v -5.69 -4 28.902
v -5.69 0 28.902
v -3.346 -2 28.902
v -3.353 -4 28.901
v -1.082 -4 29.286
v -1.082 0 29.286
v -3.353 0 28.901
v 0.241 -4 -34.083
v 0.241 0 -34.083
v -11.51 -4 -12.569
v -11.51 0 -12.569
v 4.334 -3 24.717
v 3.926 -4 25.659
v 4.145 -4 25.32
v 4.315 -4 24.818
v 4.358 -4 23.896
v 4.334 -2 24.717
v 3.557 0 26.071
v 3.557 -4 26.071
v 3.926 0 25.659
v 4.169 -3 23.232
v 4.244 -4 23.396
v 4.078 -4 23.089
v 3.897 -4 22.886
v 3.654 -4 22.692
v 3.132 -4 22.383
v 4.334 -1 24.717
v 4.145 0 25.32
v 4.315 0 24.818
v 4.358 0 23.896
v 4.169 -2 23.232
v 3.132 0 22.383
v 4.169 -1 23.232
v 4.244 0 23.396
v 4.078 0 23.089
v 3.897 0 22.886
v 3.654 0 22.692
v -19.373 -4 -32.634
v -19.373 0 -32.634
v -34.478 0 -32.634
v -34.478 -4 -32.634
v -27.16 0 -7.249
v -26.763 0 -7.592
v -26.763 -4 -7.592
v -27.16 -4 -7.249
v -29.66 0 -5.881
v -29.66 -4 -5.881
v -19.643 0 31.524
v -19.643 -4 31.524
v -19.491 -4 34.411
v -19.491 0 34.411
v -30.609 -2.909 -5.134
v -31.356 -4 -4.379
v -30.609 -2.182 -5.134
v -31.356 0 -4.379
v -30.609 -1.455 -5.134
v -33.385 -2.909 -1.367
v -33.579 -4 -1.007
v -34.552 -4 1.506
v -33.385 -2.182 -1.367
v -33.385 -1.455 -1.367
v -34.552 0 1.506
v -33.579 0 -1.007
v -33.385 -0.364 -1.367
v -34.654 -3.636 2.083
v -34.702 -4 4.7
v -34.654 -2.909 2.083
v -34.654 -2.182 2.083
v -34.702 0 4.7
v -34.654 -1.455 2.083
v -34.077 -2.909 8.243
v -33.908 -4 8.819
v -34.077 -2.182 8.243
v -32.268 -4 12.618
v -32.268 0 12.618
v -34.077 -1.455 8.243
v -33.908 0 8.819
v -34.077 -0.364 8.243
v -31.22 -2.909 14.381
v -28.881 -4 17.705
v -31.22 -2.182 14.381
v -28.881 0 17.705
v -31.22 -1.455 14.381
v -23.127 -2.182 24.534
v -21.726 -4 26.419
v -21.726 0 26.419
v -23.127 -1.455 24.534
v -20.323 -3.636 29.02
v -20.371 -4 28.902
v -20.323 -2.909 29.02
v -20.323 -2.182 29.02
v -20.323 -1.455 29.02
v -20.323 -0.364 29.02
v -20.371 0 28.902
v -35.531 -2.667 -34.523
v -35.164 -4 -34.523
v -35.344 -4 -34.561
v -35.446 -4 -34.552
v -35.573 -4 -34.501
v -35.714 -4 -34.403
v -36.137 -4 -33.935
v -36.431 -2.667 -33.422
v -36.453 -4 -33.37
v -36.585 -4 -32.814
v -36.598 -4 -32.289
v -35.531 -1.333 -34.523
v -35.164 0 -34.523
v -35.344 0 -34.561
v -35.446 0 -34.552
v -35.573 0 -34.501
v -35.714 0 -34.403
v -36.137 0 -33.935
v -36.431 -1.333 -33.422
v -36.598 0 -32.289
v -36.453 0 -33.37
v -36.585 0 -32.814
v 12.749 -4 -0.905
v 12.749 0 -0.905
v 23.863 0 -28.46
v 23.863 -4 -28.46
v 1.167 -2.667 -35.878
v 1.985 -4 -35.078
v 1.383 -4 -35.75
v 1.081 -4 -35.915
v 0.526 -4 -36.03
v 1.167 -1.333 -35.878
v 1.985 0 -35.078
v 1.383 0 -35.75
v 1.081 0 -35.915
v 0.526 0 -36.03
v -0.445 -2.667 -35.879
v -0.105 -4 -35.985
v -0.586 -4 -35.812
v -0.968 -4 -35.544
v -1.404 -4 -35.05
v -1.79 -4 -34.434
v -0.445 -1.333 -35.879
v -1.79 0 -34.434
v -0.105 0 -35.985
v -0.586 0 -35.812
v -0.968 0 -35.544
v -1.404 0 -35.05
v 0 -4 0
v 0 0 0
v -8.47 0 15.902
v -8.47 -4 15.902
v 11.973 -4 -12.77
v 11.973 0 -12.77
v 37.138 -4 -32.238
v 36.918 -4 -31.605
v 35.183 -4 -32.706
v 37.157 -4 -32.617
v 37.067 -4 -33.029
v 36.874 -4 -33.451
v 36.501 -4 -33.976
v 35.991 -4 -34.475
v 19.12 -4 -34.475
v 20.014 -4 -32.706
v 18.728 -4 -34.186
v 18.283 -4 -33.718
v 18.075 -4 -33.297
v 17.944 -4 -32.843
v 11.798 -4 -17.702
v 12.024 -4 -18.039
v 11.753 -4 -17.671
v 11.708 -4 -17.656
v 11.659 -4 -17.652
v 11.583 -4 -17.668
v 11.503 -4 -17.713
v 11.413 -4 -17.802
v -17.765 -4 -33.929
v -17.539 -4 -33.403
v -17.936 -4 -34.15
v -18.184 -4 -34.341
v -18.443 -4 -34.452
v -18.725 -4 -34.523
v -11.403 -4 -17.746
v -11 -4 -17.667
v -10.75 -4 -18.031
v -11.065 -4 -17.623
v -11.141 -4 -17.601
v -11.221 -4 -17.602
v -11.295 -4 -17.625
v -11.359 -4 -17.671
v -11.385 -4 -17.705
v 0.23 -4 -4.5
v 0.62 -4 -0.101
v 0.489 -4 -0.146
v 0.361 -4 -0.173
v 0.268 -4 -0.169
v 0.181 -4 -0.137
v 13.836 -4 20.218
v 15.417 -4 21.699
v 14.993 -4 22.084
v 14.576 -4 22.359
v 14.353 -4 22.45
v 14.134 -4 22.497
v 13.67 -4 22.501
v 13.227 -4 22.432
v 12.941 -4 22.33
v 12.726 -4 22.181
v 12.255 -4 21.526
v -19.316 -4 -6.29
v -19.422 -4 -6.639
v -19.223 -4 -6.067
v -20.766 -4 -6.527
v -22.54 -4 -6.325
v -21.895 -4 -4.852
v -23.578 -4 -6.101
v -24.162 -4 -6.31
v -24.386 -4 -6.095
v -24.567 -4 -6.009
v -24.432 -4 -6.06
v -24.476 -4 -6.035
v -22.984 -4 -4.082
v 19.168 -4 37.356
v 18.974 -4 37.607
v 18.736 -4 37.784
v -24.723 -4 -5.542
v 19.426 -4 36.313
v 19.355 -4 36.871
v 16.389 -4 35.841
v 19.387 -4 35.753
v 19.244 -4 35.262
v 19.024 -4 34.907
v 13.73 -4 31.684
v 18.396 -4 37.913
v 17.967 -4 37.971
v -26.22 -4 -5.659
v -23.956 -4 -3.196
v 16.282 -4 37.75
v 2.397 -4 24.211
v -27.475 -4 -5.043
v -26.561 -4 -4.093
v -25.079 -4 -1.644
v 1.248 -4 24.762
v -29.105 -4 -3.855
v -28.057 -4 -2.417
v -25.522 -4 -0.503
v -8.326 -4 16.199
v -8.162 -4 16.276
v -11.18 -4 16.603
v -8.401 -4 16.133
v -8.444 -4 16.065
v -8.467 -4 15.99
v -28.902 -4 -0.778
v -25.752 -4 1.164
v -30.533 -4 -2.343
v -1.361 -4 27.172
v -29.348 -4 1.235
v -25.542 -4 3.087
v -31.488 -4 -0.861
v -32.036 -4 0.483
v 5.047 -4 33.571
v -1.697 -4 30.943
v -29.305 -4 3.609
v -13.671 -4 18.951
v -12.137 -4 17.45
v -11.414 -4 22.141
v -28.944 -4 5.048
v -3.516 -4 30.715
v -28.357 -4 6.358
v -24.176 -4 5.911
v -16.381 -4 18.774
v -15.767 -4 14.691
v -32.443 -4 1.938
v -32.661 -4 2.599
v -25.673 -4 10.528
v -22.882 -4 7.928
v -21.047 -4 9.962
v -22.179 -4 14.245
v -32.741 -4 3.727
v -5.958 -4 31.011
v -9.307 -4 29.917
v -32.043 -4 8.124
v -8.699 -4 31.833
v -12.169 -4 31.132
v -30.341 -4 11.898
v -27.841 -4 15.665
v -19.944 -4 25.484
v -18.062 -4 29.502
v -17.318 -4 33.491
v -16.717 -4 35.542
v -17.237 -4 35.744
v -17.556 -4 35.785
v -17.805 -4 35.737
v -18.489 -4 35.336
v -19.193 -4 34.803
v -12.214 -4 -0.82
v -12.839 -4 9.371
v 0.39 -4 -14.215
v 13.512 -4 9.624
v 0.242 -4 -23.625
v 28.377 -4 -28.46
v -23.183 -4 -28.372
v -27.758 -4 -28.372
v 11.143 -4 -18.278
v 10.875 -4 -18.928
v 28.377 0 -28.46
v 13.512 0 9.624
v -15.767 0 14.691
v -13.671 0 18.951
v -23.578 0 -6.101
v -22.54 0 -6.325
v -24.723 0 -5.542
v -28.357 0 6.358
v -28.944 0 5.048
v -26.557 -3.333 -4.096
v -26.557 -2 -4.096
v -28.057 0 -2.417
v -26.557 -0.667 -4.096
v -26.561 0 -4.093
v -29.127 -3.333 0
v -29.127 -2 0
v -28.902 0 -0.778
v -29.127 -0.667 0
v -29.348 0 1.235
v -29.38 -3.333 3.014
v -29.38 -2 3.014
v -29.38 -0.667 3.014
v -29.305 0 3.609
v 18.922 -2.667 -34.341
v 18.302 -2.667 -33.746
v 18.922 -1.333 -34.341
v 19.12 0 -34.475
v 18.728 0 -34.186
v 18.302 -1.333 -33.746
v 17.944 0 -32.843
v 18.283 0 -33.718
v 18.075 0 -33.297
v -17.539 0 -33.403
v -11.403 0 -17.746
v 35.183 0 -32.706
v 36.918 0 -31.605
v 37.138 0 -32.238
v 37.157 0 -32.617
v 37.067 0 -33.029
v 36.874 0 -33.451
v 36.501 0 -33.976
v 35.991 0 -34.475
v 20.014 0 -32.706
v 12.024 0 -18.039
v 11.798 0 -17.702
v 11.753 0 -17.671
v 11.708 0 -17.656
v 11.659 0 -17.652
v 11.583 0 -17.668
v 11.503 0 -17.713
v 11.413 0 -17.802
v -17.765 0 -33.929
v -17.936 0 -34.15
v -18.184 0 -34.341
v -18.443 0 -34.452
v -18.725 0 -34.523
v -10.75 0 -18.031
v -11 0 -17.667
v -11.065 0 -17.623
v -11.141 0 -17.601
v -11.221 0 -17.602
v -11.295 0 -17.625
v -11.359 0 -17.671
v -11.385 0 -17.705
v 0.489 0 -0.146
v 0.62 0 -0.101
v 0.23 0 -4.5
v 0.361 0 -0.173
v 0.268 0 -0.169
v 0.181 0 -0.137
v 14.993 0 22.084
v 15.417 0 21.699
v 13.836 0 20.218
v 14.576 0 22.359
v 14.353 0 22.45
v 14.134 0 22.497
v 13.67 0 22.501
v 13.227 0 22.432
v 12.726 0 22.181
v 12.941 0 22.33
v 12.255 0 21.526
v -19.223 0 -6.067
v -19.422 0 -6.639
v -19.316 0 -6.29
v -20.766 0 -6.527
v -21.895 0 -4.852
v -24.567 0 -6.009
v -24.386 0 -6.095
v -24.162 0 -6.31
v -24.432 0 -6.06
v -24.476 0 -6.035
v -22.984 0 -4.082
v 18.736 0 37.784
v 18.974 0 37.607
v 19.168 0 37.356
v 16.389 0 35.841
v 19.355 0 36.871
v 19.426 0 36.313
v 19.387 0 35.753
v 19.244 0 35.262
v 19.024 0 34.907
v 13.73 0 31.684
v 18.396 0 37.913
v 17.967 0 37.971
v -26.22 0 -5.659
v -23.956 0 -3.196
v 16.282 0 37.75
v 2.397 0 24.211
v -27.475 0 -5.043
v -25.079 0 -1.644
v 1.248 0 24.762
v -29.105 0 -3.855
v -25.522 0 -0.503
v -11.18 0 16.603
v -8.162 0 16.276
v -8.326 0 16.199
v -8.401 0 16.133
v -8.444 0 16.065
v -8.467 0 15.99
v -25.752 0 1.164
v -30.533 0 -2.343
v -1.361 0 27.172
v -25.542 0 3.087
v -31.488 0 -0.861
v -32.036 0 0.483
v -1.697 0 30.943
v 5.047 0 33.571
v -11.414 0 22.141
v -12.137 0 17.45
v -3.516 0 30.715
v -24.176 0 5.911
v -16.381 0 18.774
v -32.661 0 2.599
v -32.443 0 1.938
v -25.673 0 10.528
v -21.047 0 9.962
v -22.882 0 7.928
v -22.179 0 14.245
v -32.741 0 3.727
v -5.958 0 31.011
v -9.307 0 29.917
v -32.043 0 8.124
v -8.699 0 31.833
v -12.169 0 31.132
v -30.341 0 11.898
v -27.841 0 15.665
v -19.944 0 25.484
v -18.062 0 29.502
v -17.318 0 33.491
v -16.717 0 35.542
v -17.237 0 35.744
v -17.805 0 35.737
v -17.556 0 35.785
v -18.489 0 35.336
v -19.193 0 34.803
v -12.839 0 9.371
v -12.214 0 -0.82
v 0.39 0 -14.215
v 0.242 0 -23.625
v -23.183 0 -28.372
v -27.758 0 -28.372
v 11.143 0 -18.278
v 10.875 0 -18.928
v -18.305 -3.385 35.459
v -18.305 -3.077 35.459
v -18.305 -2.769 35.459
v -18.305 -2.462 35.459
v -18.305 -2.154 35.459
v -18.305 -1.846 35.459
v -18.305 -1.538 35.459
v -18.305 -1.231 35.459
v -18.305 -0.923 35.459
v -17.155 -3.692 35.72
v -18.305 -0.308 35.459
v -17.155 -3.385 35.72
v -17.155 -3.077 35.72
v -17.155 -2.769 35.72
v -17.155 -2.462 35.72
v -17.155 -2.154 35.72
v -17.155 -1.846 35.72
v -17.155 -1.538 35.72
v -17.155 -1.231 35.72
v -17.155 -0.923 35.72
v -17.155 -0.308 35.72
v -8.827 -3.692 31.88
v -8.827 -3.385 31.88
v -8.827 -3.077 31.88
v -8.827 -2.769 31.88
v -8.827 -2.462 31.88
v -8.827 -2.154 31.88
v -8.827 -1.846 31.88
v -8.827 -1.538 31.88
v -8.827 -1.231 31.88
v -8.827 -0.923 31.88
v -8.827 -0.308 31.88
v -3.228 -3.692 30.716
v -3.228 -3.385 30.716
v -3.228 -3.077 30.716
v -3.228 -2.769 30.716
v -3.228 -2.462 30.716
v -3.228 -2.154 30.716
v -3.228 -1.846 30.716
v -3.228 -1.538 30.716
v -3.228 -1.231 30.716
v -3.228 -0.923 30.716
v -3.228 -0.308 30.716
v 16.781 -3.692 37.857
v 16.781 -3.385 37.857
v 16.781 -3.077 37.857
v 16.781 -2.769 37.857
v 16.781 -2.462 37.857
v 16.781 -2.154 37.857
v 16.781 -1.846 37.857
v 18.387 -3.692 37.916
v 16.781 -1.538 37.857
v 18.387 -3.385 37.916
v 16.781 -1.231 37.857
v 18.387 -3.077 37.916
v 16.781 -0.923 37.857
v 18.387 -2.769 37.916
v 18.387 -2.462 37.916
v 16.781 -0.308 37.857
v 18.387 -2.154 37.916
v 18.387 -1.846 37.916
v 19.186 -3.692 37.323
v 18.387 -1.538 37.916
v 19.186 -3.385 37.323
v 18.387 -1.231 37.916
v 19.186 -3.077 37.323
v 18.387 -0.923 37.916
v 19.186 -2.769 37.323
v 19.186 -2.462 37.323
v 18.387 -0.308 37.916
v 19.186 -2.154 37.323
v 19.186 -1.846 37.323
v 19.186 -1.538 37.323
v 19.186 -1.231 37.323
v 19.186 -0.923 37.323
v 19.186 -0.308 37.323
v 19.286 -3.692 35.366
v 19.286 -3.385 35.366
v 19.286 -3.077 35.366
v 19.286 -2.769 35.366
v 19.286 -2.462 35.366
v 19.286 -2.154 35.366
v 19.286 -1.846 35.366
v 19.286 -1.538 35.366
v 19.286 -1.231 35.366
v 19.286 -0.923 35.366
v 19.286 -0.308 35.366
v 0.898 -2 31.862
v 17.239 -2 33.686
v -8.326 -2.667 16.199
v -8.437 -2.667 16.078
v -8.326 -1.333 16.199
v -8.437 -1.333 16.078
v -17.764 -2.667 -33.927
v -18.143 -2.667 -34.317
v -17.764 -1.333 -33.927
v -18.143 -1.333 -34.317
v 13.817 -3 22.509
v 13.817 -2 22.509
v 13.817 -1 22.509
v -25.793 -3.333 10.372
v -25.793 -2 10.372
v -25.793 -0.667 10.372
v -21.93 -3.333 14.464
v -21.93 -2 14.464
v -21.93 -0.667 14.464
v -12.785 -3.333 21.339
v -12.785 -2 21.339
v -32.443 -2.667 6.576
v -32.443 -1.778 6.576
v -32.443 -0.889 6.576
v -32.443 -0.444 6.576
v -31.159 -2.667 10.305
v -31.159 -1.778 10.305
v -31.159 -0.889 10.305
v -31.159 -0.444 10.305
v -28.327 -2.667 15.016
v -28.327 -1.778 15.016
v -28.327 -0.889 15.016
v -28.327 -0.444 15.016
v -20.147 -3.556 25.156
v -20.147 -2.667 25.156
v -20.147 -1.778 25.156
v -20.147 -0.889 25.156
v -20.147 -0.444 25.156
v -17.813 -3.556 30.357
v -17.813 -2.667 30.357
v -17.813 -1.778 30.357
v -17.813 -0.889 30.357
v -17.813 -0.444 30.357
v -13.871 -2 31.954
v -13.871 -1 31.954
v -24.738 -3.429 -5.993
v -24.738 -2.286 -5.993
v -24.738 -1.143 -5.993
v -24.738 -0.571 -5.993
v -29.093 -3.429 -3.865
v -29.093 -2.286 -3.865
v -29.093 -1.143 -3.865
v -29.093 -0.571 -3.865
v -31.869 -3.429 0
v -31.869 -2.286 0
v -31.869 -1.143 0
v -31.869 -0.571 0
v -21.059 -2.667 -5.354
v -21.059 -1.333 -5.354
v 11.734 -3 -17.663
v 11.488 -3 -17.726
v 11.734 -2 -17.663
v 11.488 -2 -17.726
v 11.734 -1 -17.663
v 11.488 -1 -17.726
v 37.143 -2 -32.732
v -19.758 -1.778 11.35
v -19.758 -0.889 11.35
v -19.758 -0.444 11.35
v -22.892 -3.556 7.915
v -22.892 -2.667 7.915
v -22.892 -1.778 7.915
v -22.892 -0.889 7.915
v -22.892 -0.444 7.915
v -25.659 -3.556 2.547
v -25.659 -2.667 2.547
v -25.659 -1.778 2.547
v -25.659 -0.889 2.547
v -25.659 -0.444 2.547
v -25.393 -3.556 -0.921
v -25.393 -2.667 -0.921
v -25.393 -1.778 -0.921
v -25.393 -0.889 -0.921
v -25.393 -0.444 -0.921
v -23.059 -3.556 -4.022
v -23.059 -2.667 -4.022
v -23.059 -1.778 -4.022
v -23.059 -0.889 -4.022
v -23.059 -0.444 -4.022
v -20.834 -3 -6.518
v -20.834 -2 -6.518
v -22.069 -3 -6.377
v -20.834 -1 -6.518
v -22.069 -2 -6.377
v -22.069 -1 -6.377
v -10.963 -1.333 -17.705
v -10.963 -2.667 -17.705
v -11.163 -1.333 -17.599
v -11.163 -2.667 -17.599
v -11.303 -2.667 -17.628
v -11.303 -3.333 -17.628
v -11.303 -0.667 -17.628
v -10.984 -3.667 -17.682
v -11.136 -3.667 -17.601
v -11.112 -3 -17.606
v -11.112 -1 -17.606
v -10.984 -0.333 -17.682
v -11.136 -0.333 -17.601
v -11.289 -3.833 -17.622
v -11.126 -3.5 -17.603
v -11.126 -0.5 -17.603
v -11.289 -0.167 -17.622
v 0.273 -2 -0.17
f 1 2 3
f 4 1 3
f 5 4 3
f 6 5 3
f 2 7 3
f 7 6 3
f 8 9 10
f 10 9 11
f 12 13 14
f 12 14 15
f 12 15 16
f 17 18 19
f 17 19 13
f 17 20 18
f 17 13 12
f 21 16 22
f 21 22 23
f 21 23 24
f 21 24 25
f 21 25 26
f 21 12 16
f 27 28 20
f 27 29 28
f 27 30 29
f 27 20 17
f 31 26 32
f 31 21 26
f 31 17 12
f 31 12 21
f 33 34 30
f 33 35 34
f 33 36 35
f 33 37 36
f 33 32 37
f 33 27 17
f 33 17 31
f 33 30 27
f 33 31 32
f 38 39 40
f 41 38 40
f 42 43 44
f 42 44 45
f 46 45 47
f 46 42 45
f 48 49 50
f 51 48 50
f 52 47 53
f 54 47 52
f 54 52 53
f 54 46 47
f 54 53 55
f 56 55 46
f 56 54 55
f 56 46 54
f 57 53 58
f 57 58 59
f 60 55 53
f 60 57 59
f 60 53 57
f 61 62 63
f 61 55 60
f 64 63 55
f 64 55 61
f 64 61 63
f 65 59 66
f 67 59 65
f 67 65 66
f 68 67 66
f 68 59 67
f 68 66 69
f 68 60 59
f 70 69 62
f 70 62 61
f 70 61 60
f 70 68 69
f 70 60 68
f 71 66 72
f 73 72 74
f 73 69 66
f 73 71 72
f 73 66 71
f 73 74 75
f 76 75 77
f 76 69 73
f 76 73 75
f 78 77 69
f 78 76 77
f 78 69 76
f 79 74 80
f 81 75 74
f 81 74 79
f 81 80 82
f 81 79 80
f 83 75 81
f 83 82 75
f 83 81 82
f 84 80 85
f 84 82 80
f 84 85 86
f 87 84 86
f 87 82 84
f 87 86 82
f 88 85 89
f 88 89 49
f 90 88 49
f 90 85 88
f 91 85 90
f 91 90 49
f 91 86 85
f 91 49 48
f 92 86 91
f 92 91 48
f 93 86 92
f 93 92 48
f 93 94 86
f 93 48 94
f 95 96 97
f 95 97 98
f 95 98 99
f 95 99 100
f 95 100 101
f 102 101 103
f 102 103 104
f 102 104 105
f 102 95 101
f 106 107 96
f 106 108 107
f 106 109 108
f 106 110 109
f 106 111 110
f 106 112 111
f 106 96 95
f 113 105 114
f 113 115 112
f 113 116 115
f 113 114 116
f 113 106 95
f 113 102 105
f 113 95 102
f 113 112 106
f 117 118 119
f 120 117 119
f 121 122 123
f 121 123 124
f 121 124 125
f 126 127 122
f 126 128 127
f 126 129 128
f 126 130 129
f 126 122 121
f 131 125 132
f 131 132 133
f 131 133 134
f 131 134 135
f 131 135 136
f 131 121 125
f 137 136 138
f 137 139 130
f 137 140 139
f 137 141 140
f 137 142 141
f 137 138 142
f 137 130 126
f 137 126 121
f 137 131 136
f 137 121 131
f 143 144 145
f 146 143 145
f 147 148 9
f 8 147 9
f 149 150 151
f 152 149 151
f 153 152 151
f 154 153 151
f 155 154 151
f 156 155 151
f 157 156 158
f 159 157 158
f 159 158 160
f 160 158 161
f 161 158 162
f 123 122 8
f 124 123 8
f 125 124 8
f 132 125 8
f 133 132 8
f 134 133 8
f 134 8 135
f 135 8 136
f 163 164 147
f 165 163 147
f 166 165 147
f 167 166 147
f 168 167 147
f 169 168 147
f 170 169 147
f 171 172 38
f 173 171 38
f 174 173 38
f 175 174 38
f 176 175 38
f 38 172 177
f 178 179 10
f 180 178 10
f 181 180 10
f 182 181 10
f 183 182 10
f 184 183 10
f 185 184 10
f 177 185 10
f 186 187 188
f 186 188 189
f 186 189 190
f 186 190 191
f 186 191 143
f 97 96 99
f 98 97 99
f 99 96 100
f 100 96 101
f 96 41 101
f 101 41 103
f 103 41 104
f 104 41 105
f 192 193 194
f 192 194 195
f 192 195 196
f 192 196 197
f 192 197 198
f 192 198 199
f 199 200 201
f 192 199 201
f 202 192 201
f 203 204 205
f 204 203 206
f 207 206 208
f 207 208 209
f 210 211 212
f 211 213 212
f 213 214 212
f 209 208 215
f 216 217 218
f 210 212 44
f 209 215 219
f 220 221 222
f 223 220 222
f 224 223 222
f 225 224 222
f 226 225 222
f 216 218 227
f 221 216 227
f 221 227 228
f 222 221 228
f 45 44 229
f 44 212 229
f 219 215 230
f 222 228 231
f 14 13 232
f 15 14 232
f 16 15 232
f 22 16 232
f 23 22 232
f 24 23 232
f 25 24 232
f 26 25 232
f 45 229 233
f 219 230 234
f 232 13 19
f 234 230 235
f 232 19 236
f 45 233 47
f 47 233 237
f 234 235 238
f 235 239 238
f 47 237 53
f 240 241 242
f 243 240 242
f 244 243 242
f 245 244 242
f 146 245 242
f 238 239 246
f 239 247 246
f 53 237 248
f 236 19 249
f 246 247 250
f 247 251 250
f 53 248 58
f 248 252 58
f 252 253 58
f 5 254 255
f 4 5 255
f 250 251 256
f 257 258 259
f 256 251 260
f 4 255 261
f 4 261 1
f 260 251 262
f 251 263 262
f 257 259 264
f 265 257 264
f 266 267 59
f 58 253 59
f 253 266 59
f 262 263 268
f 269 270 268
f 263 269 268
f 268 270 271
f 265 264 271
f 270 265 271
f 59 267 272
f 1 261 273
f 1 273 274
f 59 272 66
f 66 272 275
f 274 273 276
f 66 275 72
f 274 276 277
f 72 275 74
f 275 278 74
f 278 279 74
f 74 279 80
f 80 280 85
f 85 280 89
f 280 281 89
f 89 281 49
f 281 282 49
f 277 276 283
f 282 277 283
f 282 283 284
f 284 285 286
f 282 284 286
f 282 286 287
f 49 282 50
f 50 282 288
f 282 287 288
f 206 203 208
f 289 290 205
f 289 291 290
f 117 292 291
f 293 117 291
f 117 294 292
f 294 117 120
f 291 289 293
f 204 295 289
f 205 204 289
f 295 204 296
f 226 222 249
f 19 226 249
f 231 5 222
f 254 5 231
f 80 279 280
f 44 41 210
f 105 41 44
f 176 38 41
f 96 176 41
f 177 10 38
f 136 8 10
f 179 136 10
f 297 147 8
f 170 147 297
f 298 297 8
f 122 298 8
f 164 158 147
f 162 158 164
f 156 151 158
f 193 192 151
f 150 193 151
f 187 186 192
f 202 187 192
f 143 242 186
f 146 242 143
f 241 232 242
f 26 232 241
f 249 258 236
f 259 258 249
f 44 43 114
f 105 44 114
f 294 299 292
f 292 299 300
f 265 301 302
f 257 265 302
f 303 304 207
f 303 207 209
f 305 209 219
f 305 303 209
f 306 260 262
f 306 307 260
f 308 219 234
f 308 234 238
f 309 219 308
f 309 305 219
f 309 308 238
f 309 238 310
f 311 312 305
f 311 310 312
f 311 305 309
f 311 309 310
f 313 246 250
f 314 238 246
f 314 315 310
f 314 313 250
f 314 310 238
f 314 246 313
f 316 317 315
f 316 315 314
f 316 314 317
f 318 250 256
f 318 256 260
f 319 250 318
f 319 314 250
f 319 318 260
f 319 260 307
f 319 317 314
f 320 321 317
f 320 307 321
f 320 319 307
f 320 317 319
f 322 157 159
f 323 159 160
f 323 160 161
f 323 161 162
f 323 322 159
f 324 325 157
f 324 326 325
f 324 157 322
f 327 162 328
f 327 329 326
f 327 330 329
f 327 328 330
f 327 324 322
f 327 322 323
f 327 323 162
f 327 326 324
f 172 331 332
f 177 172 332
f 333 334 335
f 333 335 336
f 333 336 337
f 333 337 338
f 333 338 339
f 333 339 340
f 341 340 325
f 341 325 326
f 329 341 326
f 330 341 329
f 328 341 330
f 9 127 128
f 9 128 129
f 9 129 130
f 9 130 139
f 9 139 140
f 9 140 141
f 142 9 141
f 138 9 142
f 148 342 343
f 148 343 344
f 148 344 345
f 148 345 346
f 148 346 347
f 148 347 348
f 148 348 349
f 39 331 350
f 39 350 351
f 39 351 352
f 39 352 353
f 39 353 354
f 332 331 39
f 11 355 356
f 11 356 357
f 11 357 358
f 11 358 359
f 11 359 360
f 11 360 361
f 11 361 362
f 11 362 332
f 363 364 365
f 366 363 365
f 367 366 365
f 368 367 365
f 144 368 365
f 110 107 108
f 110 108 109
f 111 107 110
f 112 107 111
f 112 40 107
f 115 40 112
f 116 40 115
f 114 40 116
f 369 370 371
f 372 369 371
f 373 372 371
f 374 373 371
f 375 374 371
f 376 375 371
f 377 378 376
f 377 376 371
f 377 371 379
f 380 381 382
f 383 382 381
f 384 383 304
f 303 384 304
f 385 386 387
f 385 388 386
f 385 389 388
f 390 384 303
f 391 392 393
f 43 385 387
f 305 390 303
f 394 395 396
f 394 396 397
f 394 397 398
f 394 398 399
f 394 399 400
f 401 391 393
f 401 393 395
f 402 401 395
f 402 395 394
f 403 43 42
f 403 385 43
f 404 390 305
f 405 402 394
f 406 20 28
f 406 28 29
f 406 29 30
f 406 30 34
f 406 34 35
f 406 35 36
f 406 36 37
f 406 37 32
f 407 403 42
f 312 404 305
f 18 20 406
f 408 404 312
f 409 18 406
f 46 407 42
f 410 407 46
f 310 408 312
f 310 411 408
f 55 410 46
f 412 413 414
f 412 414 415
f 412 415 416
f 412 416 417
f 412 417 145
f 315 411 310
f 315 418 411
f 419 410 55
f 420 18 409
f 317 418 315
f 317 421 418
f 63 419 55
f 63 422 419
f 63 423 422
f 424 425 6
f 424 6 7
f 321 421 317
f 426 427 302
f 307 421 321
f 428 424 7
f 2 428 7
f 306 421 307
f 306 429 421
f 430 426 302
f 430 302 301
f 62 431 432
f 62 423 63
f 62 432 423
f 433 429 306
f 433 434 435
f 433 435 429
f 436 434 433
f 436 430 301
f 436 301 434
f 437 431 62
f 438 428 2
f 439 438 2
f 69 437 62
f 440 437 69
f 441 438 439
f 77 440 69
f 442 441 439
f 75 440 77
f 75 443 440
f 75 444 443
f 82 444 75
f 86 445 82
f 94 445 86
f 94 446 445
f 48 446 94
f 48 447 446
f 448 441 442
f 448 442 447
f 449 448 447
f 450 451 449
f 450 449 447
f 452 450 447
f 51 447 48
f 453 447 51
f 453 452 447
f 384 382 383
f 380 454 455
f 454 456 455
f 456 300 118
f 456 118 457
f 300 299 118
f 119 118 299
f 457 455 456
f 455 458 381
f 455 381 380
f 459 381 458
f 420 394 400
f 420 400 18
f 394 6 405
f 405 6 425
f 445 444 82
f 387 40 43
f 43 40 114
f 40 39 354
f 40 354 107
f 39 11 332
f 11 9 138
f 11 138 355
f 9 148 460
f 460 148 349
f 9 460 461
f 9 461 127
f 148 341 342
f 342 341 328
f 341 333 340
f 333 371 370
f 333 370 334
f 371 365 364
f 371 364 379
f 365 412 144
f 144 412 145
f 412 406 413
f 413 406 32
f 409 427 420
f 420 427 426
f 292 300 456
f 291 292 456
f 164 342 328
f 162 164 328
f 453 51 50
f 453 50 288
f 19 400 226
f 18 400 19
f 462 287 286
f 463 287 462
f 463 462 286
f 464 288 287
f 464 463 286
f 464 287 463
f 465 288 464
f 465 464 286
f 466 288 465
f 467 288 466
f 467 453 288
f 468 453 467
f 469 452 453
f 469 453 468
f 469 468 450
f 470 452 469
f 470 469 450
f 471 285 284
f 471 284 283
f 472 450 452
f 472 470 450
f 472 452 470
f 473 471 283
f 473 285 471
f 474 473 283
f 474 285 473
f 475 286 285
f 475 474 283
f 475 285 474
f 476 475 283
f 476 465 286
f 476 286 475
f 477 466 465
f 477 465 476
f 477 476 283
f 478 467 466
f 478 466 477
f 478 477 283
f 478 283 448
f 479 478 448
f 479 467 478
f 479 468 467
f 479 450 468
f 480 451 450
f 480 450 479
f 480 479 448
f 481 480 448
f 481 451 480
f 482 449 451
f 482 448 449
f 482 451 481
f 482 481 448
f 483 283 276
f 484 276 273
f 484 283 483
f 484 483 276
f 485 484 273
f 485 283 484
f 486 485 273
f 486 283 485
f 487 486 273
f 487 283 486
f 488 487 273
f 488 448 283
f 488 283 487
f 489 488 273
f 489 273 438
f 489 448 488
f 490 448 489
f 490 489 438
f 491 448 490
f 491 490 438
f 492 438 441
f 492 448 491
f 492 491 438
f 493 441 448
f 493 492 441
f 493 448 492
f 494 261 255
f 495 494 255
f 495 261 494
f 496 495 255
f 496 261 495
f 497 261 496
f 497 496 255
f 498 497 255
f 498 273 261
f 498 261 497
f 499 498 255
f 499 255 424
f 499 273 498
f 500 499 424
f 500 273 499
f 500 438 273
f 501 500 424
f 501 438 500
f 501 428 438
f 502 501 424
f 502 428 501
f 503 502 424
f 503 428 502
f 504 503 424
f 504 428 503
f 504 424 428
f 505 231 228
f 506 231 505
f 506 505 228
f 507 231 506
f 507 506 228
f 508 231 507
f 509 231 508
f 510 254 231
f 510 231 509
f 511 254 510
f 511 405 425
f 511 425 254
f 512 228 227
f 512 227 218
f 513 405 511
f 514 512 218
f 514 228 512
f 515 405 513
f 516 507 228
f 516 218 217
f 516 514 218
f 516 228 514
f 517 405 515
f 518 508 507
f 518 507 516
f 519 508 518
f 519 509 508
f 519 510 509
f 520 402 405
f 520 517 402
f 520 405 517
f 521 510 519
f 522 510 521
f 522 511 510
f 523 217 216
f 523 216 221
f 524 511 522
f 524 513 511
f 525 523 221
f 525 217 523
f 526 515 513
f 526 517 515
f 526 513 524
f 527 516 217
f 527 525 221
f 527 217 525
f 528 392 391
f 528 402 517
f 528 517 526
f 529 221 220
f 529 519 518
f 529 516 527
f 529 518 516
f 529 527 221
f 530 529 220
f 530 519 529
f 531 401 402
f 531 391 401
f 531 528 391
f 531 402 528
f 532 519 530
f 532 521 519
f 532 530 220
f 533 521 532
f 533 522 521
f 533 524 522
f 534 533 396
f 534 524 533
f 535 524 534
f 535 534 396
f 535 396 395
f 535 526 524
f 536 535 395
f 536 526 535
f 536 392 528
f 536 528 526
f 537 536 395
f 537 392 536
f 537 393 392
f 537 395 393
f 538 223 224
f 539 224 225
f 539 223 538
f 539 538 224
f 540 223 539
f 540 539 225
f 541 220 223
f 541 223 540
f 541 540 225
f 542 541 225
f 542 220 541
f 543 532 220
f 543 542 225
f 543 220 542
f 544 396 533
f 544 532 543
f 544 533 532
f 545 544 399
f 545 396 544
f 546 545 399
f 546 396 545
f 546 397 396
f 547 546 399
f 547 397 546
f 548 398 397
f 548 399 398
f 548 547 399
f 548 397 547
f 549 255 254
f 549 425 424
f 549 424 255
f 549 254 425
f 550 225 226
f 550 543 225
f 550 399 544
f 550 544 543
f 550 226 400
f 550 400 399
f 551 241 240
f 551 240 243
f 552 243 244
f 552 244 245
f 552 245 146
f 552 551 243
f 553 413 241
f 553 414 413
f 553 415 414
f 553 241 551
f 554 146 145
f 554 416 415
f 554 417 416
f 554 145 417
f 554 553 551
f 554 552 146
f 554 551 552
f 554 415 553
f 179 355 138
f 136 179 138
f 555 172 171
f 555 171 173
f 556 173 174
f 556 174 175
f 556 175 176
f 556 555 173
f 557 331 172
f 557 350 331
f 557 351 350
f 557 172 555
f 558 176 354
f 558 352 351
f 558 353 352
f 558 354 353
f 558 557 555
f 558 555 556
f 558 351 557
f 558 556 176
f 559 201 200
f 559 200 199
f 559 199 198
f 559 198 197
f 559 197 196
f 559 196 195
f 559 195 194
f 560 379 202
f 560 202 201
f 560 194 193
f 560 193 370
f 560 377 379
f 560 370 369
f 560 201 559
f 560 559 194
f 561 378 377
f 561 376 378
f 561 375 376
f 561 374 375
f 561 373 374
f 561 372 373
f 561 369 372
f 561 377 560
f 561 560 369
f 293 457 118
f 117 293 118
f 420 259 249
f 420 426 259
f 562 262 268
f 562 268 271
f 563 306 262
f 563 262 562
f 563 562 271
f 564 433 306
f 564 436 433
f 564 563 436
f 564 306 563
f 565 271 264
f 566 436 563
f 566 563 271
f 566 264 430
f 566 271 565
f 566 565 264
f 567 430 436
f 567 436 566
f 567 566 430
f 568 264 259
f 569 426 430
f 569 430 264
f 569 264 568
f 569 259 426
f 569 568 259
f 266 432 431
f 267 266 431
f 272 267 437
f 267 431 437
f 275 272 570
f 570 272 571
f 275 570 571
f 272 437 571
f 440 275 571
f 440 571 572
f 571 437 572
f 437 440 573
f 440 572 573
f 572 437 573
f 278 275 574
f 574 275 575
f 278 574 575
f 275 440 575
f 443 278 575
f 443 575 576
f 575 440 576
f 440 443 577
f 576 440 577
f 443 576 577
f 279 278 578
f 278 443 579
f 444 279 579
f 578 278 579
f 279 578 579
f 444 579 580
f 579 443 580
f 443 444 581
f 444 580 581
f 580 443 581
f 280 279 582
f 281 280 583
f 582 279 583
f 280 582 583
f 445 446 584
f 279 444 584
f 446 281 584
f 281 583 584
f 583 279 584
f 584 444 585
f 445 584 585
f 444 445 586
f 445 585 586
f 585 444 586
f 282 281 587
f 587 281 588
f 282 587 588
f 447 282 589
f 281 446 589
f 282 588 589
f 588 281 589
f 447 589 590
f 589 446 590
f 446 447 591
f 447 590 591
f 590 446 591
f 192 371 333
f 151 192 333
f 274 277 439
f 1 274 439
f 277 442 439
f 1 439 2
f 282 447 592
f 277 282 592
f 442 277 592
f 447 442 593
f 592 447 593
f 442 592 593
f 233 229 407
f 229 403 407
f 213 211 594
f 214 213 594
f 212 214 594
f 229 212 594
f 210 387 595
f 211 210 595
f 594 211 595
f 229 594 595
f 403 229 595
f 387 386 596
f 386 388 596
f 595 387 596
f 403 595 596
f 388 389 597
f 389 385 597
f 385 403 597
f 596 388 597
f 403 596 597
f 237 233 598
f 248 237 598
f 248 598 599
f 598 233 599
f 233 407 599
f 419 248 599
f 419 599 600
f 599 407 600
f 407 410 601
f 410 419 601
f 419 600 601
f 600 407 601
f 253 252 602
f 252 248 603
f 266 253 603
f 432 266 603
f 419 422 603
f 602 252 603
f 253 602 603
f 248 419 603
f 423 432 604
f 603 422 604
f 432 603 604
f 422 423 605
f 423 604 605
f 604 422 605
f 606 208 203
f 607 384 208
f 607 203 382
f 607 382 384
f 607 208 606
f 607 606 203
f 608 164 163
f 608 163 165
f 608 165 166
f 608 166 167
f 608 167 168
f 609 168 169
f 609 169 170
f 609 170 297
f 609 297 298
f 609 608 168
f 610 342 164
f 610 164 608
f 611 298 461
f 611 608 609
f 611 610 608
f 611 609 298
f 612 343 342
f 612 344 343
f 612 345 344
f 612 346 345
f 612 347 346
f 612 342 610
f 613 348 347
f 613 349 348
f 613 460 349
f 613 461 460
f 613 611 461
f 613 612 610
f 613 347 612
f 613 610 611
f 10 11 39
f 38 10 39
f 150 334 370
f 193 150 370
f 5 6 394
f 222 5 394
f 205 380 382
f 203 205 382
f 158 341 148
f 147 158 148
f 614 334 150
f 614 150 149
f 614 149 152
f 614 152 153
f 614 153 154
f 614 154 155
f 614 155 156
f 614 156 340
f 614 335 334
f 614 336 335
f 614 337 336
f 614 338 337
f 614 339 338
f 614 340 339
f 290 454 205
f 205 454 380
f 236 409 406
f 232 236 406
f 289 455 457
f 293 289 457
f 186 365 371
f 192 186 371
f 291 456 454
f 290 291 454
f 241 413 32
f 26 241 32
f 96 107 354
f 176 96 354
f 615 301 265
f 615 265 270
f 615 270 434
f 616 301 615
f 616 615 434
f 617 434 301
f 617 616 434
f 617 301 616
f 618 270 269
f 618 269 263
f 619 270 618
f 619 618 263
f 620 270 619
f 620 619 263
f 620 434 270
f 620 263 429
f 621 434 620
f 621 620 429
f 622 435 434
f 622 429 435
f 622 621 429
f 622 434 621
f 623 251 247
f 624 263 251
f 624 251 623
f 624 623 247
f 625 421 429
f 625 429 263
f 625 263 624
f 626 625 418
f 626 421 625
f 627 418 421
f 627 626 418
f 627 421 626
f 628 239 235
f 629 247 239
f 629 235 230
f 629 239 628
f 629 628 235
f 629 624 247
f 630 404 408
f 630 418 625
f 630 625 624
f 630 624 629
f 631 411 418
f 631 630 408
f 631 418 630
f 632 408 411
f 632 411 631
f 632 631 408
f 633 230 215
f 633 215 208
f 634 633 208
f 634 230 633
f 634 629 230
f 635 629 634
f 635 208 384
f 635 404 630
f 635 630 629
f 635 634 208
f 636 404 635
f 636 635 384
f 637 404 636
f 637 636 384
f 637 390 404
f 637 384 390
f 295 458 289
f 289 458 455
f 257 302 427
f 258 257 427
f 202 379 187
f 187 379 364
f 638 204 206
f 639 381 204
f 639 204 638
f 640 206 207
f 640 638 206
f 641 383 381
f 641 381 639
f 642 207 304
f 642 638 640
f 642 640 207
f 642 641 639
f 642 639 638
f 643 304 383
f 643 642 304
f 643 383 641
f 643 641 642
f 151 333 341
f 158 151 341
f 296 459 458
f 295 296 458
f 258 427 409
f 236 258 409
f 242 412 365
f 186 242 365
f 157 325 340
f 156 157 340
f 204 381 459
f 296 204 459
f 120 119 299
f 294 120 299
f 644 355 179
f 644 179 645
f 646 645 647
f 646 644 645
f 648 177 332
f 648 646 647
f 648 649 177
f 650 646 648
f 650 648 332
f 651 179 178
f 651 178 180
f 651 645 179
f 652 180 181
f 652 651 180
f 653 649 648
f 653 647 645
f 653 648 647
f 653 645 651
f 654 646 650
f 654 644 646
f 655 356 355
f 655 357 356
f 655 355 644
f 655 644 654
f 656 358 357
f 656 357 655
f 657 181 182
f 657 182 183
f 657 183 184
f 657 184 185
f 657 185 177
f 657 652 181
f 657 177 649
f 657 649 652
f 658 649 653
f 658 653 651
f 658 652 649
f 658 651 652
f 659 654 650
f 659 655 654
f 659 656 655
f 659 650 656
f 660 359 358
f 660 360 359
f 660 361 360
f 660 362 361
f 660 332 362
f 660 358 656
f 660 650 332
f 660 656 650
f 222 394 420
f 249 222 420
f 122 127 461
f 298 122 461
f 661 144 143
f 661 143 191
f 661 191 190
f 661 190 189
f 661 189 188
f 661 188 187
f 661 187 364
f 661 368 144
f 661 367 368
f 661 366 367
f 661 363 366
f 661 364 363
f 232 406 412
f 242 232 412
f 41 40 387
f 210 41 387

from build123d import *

# Parameters (mm, degrees)
F1_DEPTH = 4
F3_DEPTH = 4


# Not quite as in the source:
# - the program builds the solid bodies; features that only make, move or delete a surface that nothing else refers to are left out


with BuildPart() as f1:
    # F0 (on Front) → F1 (new body)
    with BuildSketch(Plane.XZ):
        Polygon((-19.4217161833, -6.6394530033), (-27.7575291693, -28.3715538681), (-23.1834277511, -28.3715538681), (-12.2142331675, -0.81999955), (0.2424462854, -23.6251421751), (12.7486815966, -0.9048308448), (23.8632653011, -28.4597538413), (28.3766854557, -28.4597538413), (13.5119855407, 9.6240406854), (0.3901409885, -14.2146594537), (-12.8388348967, 9.3706743792), (-19.2233994603, -6.0667619109), (-19.315803546, -6.2901886101), (-19.0307870507, -6.5492987633), align=None)
    extrude(amount=F1_DEPTH)

    # F0 (on Front) → F3 (join)
    with BuildSketch(Plane.XZ):
        with BuildLine():
            add(Edge.make_bspline(
                [(-35.1637251496, -34.5231422063), (-35.2745312626, -34.5561823678), (-35.6035289606, -34.654304467), (-36.6117457532, -33.4166323146), (-36.6023133695, -32.6509350181), (-36.5978814662, -32.2887599468)],
                knots=[0, 0, 0, 0, 0.2111198615, 0.6268416674, 1, 1, 1, 1], degree=3))
            Line((-35.1637251496, -34.5231422063), (-18.7250807702, -34.5231422063))
            add(Edge.make_bspline(
                [(-17.538975038, -33.402744049), (-17.611132101, -33.5982034924), (-17.7255501876, -33.9379030837), (-18.1198933231, -34.3655062286), (-18.5178964655, -34.4823988841), (-18.7250807702, -34.5231422063)],
                knots=[0, 0, 0, 0, 0.3313469636, 0.6551303283, 1, 1, 1, 1], degree=3))
            Line((-17.538975038, -33.402744049), (-11.4031481076, -17.7456413598))
            add(Edge.make_bspline(
                [(-10.749549605, -18.0306378752), (-10.8298087166, -17.9267145736), (-10.9355150168, -17.6876046133), (-11.1533348511, -17.5614089352), (-11.3649684936, -17.6323335618), (-11.4031481076, -17.7456413598)],
                knots=[0, 0, 0, 0, 0.3827269779, 0.6748101929, 1, 1, 1, 1], degree=3))
            Line((-10.749549605, -18.0306378752), (-1.789764151, -34.4338202755))
            add(Edge.make_bspline(
                [(1.9849899689, -35.0782312452), (1.7096466368, -35.4211391418), (1.3050154791, -36.05677829), (-0.6620473159, -36.123537512), (-1.4189460368, -35.0981913004), (-1.789764151, -34.4338202755)],
                knots=[0, 0, 0, 0, 0.2856387916, 0.6247331157, 1, 1, 1, 1], degree=3))
            Line((1.9849899689, -35.0782312452), (10.8746383339, -18.9282409847))
            add(Edge.make_bspline(
                [(12.0244985446, -18.0388428271), (11.9725750544, -17.9490208887), (11.8797340892, -17.78841621), (11.744725143, -17.6291823261), (11.3691565314, -17.67640337), (11.0777840099, -18.4139921669), (10.8746383339, -18.9282409847)],
                knots=[0, 0, 0, 0, 0.2060682504, 0.3684570355, 0.559686611, 1, 1, 1, 1], degree=3))
            Line((12.0244985446, -18.0388428271), (17.9444543715, -32.8427049722))
            add(Edge.make_bspline(
                [(19.1195974171, -34.4750714604), (19.0590878531, -34.4462685115), (18.9069963789, -34.3306804628), (18.1880916185, -33.7704461278), (18.0246763229, -33.1607819226), (17.9444543715, -32.8427049722)],
                knots=[0, 0, 0, 0, 0.2036652656, 0.5896746092, 1, 1, 1, 1], degree=3))
            Line((19.1195974171, -34.4750714604), (35.9913371503, -34.4750714604))
            add(Edge.make_bspline(
                [(36.917551974, -31.6054179477), (37.096636226, -31.9865397753), (37.358811422, -32.7884619292), (36.6453477203, -33.9356747232), (35.9913371503, -34.4750714604)],
                knots=[0, 0, 0, 0, 0.4258250202, 1, 1, 1, 1], degree=3))
            Line((36.917551974, -31.6054179477), (15.4165393649, 21.6992097865))
            add(Edge.make_bspline(
                [(12.2546441238, 21.5262000154), (12.5737046322, 22.0672148588), (12.886276927, 22.4090391583), (13.8326309549, 22.5382735172), (14.5347285525, 22.471159047), (15.1069781666, 22.0141567545), (15.4165393649, 21.6992097865)],
                knots=[0, 0, 0, 0, 0.2748904441, 0.5080982642, 0.721442809, 1, 1, 1, 1], degree=3))
            Line((12.2546441238, 21.5262000154), (0.6201447686, -0.1007694518))
            add(Edge.make_bspline(
                [(0, 0), (0.0863636294, -0.0759495763), (0.2632816512, -0.2315341538), (0.4993266168, -0.1450406271), (0.6201447686, -0.1007694518)],
                knots=[0, 0, 0, 0, 0.4881562014, 1, 1, 1, 1], degree=3))
            Line((0, 0), (-8.4702158347, 15.9015208483))
            add(Edge.make_bspline(
                [(-8.1622106954, 16.276223585), (-8.3447881043, 16.2160024047), (-8.4849828854, 16.110856086), (-8.4702158347, 15.9015208483)],
                knots=[0, 0, 0, 0, 0.4850456749, 0.4850456749, 0.4850456749, 0.4850456749], degree=3))
            Line((-8.1622106954, 16.276223585), (3.1315775122, 22.3828852177))
            add(Edge.make_bspline(
                [(3.5565522512, 26.0707366595), (3.7250692348, 25.8944983199), (4.0768574738, 25.526591336), (4.4162895921, 24.7345286511), (4.3867106206, 23.0702393334), (3.542298202, 22.6078100122), (3.1315775122, 22.3828852177)],
                knots=[0, 0, 0, 0, 0.2048403686, 0.4276152529, 0.721593083, 1, 1, 1, 1], degree=3))
            add(Edge.make_bspline(
                [(-19.4905090892, 34.4106449307), (-19.3913416638, 34.5768098105), (-19.1771283464, 34.8821357986), (-18.2909772268, 35.4649028918), (-17.4167100076, 36.0581049326), (-15.046233937, 34.4869007756), (-8.8847282905, 31.765149045), (-5.5806993412, 30.8516497616), (-2.9868246918, 30.6200128066), (-0.0073204146, 31.2052668466), (16.3641647116, 38.670642674), (19.4600039149, 37.7428738516), (19.5129350415, 35.0531160006), (17.3283449079, 33.686036308), (9.4521634968, 29.2572953328), (3.5565522512, 26.0707366595)],
                knots=[0, 0, 0, 0, 0.0301352733, 0.0712071496, 0.1085985734, 0.1729295184, 0.2794198429, 0.3554207551, 0.415110422, 0.4886293008, 0.6594178969, 0.7227096196, 0.779157198, 0.837654272, 1, 1, 1, 1], degree=3))
            add(Edge.make_bspline(
                [(-26.7625730485, -7.5921593234), (-26.8802814515, -7.4736795432), (-27.1267818843, -7.2257565373), (-27.7274393295, -7.041955029), (-31.0607833825, -5.2827244881), (-33.4673183648, -1.3686976246), (-35.0771704906, 2.0316336914), (-34.4110317157, 8.5701153917), (-31.4521100473, 14.4494388606), (-26.8532177553, 20.3844347406), (-23.0913588106, 24.3697313497), (-19.9077267416, 28.9225104401), (-19.4180184747, 32.4295257558), (-19.4905090892, 34.4106449307)],
                knots=[0, 0, 0, 0, 0.0311082407, 0.0650295367, 0.1496232536, 0.247006076, 0.3333177984, 0.4452947178, 0.5624364483, 0.6851720255, 0.7913099611, 0.8948572122, 1, 1, 1, 1], degree=3))
            Line((-26.7625730485, -7.5921593234), (-36.5978814662, -32.2887599468))
        make_face()
        with BuildLine():
            add(Edge.make_bspline(
                [(-19.4217161833, -6.6394530033), (-19.508625316, -6.6432673623), (-19.8019127291, -6.6566294917), (-20.8924289573, -6.5055145737), (-21.7664551749, -6.406246823), (-22.3774145873, -6.3461085054), (-22.540475484, -6.3254620685)],
                knots=[0, 0, 0, 0, 0.0464939501, 0.1284775828, 0.2166556913, 0.2472364924, 0.2472364924, 0.2472364924, 0.2472364924], degree=3))
            Line((-19.4217161833, -6.6394530033), (-19.0307870507, -6.5492987633))
            Line((-19.0307870507, -6.5492987633), (-19.315803546, -6.2901886101))
            add(Edge.make_bspline(
                [(-21.8946174861, -4.8524995225), (-21.0782101636, -5.3728390923), (-20.1991422317, -5.830401643), (-19.315803546, -6.2901886101)],
                knots=[0.9099002869, 0.9099002869, 0.9099002869, 0.9099002869, 1, 1, 1, 1], degree=3))
            add(Edge.make_bspline(
                [(-15.7669110892, 14.6913326426), (-16.1575708431, 14.3951216587), (-16.9801594317, 13.6529080865), (-19.8434335071, 11.5099121964), (-21.9911810035, 8.7813091437), (-22.9487788, 8.0396329391), (-24.9391358437, 4.6444296479), (-25.8410141184, 2.6584830617), (-25.7767362061, -1.1661814313), (-23.7980017987, -3.5419920665), (-22.300488065, -4.5938167343), (-21.8946174861, -4.8524995225)],
                knots=[0, 0, 0, 0, 0.0799570707, 0.2034389483, 0.3219077837, 0.3946894666, 0.5189098359, 0.61782501, 0.7380766484, 0.8651079121, 0.9099002869, 0.9099002869, 0.9099002869, 0.9099002869], degree=3))
            Line((-15.7669110892, 14.6913326426), (-13.6710712686, 18.9505778253))
            Line((-13.6710712686, 18.9505778253), (-12.1372425929, 17.450094223))
            Line((-12.1372425929, 17.450094223), (1.2483881547, 24.7616254087))
            Line((1.2483881547, 24.7616254087), (2.3965802164, 24.2106570771))
            Line((2.3965802164, 24.2106570771), (-11.1804655804, 16.6029661013))
            Line((-11.1804655804, 16.6029661013), (0.2299634238, -4.4997208142))
            Line((0.2299634238, -4.4997208142), (13.8358174466, 20.2182883726))
            Line((13.8358174466, 20.2182883726), (35.183429718, -32.7060341154))
            Line((35.183429718, -32.7060341154), (20.0139036961, -32.7060341154))
            Line((20.0139036961, -32.7060341154), (11.9725750544, -12.7702274851))
            Line((11.9725750544, -12.7702274851), (0.241156673, -34.082914424))
            Line((0.241156673, -34.082914424), (-11.5100983533, -12.5692319123))
            Line((-11.5100983533, -12.5692319123), (-19.3732271326, -32.6339788733))
            Line((-19.3732271326, -32.6339788733), (-34.4776880647, -32.6339788733))
            Line((-34.4776880647, -32.6339788733), (-24.161764784, -6.3103110171))
            add(Edge.make_bspline(
                [(-24.161764784, -6.3103110171), (-24.2526459585, -6.2458945342), (-24.4218489545, -6.005026647), (-24.7879581492, -6.0032503335), (-26.4467627622, -5.7694302637), (-29.2093356612, -3.9842936163), (-31.0234143453, -1.8115853262), (-31.9290028762, -0.041007341), (-32.2719053848, 1.2774798683), (-32.443283113, 1.9378054652)],
                knots=[0, 0, 0, 0, 0.0692678788, 0.1333973947, 0.2751544883, 0.4850400346, 0.6780474592, 0.8374469779, 1, 1, 1, 1], degree=3))
            add(Edge.make_bspline(
                [(-32.443283113, 1.9378054652), (-32.5460937273, 2.1811675539), (-32.8532037362, 2.9081303087), (-32.6054490494, 6.8315619317), (-31.2056244589, 10.456396718), (-28.545190558, 15.1518389989), (-22.618683209, 21.884807743), (-20.1458962988, 24.9403144345), (-18.6281517866, 27.908594809), (-17.7170611806, 30.3351509939), (-17.4082297731, 32.3915139026), (-17.3176672584, 33.4910062724)],
                knots=[0, 0, 0, 0, 0.0558619343, 0.1669597916, 0.2810807549, 0.415796098, 0.588063338, 0.7035847677, 0.8052847768, 0.8976525607, 1, 1, 1, 1], degree=3))
            add(Edge.make_bspline(
                [(-17.3176672584, 33.4910062724), (-17.221630037, 33.4597220725), (-16.9720207923, 33.3469005033), (-13.5430734754, 31.8596596856), (-10.0203260912, 29.9973066976), (-7.1406603696, 29.2607063143), (-5.6896028796, 28.9016544729)],
                knots=[0, 0, 0, 0, 0.0862425306, 0.3671206301, 0.682503877, 1, 1, 1, 1], degree=3))
            add(Edge.make_bspline(
                [(-5.6896028796, 28.9016544729), (-4.9036243336, 28.8691385408), (-3.3396702778, 28.8042656638), (-1.8322599185, 29.1262884352), (-1.0824227938, 29.2862113565)],
                knots=[0, 0, 0, 0, 0.5025756584, 1, 1, 1, 1], degree=3))
            Line((-1.0824227938, 29.2862113565), (16.3887608796, 35.8408540487))
            Line((16.3887608796, 35.8408540487), (-1.3610265687, 27.1718096203))
            add(Edge.make_bspline(
                [(-28.3569605203, 6.3584583539), (-28.2130936728, 6.6411128815), (-27.8271836576, 7.4023465501), (-25.7733867324, 10.6560215753), (-22.0445767964, 14.6239494535), (-17.4960241663, 17.781024568), (-12.7864597899, 21.8271717018), (-5.5598486203, 25.0804798141), (-1.3610265687, 27.1718096203)],
                knots=[0, 0, 0, 0, 0.0755576656, 0.2159621836, 0.3892077102, 0.5588631934, 0.7384412181, 1, 1, 1, 1], degree=3))
            add(Edge.make_bspline(
                [(-22.540475484, -6.3254620685), (-22.9495394006, -6.2736672328), (-24.22734435, -6.0317724791), (-26.6434003655, -4.1641087229), (-28.453733366, -2.0639095463), (-29.2248130286, 0.0009913676), (-29.6205864439, 3.0557923807), (-28.9095027831, 5.3913160175), (-28.3569605203, 6.3584583539)],
                knots=[0.2472364924, 0.2472364924, 0.2472364924, 0.2472364924, 0.3239532439, 0.4674432485, 0.5991747745, 0.7144941387, 0.852062496, 1, 1, 1, 1], degree=3))
        make_face(mode=Mode.SUBTRACT)
    extrude(amount=F3_DEPTH)


solid = f1.part
